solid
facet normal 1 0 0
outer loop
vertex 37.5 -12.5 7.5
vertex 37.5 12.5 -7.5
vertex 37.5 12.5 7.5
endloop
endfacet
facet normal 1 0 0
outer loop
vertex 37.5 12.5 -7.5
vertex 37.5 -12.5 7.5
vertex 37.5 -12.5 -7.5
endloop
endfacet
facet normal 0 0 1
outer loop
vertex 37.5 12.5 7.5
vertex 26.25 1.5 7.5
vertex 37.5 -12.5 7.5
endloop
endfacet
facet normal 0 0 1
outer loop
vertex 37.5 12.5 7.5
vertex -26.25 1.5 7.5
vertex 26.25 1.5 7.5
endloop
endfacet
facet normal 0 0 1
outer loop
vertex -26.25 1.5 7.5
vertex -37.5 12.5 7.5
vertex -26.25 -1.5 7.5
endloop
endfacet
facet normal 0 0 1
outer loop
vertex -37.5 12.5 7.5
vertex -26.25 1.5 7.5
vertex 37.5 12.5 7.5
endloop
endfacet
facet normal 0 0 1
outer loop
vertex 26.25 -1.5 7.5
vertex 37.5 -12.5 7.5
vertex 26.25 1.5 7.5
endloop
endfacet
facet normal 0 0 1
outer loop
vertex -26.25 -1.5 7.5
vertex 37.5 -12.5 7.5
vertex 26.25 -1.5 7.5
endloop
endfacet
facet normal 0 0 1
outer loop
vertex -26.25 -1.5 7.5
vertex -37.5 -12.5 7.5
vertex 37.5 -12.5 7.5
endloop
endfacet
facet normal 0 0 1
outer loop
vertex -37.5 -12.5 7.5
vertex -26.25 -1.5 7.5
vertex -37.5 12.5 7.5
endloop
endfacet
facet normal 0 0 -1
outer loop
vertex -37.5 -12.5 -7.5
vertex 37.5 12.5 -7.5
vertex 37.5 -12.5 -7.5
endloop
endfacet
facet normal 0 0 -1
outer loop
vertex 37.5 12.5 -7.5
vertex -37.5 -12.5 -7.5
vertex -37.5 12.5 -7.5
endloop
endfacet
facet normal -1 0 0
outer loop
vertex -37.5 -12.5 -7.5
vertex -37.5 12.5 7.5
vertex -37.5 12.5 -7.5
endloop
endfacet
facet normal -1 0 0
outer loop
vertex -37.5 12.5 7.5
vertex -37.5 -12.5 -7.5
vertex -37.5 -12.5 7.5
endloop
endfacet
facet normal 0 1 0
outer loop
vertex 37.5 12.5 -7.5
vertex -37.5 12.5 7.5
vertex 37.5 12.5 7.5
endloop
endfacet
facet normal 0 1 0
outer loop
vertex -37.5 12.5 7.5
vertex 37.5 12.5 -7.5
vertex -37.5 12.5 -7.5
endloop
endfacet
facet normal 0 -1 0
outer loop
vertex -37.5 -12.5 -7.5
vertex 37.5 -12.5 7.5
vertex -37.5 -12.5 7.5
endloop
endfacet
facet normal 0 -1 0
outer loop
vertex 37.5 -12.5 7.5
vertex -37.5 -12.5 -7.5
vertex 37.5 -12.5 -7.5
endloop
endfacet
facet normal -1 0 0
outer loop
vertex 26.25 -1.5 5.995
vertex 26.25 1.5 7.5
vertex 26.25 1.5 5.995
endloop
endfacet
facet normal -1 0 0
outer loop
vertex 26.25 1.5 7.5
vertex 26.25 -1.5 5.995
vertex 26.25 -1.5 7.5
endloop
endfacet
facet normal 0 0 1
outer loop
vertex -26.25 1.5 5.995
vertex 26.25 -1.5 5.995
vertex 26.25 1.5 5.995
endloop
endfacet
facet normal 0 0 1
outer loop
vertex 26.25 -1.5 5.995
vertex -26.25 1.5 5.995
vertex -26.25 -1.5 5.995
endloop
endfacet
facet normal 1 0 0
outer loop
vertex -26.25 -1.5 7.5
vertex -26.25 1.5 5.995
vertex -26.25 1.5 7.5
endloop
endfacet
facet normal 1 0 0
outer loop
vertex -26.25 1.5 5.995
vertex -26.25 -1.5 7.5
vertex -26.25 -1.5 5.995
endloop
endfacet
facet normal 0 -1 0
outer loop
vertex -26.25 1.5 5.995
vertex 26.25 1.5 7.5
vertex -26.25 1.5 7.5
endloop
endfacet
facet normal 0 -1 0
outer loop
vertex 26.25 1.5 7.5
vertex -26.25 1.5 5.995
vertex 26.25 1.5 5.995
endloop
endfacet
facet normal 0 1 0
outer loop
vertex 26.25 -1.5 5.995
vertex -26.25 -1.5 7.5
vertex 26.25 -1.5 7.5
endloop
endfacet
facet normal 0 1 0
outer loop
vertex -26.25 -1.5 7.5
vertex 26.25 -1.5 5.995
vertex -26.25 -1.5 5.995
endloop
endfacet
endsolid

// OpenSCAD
// Bloque Jenga — Torre Sabia
// Medidas estándar Jenga: ~7.5 x 2.5 x 1.5 cm (escala 10: 75 x 25 x 15 mm)

BLOCK_L = 75;
BLOCK_W = 25;
BLOCK_H = 15;
MARK_DEPTH = 1.5;
MARK_W = 3;
MARK_GAP = 4;

module bloque_base() {
  cube([BLOCK_L, BLOCK_W, BLOCK_H], center = true);
}

module marca_linea(offset_y) {
  translate([0, offset_y, BLOCK_H/2 - MARK_DEPTH/2])
    cube([BLOCK_L * 0.7, MARK_W, MARK_DEPTH + 0.01], center = true);
}

// Bloque FÁCIL — 1 línea (🍃 hoja)
module bloque_facil() {
  difference() {
    bloque_base();
    marca_linea(0);
  }
}

bloque_facil();

// Exportar: bloque_facil.stl
